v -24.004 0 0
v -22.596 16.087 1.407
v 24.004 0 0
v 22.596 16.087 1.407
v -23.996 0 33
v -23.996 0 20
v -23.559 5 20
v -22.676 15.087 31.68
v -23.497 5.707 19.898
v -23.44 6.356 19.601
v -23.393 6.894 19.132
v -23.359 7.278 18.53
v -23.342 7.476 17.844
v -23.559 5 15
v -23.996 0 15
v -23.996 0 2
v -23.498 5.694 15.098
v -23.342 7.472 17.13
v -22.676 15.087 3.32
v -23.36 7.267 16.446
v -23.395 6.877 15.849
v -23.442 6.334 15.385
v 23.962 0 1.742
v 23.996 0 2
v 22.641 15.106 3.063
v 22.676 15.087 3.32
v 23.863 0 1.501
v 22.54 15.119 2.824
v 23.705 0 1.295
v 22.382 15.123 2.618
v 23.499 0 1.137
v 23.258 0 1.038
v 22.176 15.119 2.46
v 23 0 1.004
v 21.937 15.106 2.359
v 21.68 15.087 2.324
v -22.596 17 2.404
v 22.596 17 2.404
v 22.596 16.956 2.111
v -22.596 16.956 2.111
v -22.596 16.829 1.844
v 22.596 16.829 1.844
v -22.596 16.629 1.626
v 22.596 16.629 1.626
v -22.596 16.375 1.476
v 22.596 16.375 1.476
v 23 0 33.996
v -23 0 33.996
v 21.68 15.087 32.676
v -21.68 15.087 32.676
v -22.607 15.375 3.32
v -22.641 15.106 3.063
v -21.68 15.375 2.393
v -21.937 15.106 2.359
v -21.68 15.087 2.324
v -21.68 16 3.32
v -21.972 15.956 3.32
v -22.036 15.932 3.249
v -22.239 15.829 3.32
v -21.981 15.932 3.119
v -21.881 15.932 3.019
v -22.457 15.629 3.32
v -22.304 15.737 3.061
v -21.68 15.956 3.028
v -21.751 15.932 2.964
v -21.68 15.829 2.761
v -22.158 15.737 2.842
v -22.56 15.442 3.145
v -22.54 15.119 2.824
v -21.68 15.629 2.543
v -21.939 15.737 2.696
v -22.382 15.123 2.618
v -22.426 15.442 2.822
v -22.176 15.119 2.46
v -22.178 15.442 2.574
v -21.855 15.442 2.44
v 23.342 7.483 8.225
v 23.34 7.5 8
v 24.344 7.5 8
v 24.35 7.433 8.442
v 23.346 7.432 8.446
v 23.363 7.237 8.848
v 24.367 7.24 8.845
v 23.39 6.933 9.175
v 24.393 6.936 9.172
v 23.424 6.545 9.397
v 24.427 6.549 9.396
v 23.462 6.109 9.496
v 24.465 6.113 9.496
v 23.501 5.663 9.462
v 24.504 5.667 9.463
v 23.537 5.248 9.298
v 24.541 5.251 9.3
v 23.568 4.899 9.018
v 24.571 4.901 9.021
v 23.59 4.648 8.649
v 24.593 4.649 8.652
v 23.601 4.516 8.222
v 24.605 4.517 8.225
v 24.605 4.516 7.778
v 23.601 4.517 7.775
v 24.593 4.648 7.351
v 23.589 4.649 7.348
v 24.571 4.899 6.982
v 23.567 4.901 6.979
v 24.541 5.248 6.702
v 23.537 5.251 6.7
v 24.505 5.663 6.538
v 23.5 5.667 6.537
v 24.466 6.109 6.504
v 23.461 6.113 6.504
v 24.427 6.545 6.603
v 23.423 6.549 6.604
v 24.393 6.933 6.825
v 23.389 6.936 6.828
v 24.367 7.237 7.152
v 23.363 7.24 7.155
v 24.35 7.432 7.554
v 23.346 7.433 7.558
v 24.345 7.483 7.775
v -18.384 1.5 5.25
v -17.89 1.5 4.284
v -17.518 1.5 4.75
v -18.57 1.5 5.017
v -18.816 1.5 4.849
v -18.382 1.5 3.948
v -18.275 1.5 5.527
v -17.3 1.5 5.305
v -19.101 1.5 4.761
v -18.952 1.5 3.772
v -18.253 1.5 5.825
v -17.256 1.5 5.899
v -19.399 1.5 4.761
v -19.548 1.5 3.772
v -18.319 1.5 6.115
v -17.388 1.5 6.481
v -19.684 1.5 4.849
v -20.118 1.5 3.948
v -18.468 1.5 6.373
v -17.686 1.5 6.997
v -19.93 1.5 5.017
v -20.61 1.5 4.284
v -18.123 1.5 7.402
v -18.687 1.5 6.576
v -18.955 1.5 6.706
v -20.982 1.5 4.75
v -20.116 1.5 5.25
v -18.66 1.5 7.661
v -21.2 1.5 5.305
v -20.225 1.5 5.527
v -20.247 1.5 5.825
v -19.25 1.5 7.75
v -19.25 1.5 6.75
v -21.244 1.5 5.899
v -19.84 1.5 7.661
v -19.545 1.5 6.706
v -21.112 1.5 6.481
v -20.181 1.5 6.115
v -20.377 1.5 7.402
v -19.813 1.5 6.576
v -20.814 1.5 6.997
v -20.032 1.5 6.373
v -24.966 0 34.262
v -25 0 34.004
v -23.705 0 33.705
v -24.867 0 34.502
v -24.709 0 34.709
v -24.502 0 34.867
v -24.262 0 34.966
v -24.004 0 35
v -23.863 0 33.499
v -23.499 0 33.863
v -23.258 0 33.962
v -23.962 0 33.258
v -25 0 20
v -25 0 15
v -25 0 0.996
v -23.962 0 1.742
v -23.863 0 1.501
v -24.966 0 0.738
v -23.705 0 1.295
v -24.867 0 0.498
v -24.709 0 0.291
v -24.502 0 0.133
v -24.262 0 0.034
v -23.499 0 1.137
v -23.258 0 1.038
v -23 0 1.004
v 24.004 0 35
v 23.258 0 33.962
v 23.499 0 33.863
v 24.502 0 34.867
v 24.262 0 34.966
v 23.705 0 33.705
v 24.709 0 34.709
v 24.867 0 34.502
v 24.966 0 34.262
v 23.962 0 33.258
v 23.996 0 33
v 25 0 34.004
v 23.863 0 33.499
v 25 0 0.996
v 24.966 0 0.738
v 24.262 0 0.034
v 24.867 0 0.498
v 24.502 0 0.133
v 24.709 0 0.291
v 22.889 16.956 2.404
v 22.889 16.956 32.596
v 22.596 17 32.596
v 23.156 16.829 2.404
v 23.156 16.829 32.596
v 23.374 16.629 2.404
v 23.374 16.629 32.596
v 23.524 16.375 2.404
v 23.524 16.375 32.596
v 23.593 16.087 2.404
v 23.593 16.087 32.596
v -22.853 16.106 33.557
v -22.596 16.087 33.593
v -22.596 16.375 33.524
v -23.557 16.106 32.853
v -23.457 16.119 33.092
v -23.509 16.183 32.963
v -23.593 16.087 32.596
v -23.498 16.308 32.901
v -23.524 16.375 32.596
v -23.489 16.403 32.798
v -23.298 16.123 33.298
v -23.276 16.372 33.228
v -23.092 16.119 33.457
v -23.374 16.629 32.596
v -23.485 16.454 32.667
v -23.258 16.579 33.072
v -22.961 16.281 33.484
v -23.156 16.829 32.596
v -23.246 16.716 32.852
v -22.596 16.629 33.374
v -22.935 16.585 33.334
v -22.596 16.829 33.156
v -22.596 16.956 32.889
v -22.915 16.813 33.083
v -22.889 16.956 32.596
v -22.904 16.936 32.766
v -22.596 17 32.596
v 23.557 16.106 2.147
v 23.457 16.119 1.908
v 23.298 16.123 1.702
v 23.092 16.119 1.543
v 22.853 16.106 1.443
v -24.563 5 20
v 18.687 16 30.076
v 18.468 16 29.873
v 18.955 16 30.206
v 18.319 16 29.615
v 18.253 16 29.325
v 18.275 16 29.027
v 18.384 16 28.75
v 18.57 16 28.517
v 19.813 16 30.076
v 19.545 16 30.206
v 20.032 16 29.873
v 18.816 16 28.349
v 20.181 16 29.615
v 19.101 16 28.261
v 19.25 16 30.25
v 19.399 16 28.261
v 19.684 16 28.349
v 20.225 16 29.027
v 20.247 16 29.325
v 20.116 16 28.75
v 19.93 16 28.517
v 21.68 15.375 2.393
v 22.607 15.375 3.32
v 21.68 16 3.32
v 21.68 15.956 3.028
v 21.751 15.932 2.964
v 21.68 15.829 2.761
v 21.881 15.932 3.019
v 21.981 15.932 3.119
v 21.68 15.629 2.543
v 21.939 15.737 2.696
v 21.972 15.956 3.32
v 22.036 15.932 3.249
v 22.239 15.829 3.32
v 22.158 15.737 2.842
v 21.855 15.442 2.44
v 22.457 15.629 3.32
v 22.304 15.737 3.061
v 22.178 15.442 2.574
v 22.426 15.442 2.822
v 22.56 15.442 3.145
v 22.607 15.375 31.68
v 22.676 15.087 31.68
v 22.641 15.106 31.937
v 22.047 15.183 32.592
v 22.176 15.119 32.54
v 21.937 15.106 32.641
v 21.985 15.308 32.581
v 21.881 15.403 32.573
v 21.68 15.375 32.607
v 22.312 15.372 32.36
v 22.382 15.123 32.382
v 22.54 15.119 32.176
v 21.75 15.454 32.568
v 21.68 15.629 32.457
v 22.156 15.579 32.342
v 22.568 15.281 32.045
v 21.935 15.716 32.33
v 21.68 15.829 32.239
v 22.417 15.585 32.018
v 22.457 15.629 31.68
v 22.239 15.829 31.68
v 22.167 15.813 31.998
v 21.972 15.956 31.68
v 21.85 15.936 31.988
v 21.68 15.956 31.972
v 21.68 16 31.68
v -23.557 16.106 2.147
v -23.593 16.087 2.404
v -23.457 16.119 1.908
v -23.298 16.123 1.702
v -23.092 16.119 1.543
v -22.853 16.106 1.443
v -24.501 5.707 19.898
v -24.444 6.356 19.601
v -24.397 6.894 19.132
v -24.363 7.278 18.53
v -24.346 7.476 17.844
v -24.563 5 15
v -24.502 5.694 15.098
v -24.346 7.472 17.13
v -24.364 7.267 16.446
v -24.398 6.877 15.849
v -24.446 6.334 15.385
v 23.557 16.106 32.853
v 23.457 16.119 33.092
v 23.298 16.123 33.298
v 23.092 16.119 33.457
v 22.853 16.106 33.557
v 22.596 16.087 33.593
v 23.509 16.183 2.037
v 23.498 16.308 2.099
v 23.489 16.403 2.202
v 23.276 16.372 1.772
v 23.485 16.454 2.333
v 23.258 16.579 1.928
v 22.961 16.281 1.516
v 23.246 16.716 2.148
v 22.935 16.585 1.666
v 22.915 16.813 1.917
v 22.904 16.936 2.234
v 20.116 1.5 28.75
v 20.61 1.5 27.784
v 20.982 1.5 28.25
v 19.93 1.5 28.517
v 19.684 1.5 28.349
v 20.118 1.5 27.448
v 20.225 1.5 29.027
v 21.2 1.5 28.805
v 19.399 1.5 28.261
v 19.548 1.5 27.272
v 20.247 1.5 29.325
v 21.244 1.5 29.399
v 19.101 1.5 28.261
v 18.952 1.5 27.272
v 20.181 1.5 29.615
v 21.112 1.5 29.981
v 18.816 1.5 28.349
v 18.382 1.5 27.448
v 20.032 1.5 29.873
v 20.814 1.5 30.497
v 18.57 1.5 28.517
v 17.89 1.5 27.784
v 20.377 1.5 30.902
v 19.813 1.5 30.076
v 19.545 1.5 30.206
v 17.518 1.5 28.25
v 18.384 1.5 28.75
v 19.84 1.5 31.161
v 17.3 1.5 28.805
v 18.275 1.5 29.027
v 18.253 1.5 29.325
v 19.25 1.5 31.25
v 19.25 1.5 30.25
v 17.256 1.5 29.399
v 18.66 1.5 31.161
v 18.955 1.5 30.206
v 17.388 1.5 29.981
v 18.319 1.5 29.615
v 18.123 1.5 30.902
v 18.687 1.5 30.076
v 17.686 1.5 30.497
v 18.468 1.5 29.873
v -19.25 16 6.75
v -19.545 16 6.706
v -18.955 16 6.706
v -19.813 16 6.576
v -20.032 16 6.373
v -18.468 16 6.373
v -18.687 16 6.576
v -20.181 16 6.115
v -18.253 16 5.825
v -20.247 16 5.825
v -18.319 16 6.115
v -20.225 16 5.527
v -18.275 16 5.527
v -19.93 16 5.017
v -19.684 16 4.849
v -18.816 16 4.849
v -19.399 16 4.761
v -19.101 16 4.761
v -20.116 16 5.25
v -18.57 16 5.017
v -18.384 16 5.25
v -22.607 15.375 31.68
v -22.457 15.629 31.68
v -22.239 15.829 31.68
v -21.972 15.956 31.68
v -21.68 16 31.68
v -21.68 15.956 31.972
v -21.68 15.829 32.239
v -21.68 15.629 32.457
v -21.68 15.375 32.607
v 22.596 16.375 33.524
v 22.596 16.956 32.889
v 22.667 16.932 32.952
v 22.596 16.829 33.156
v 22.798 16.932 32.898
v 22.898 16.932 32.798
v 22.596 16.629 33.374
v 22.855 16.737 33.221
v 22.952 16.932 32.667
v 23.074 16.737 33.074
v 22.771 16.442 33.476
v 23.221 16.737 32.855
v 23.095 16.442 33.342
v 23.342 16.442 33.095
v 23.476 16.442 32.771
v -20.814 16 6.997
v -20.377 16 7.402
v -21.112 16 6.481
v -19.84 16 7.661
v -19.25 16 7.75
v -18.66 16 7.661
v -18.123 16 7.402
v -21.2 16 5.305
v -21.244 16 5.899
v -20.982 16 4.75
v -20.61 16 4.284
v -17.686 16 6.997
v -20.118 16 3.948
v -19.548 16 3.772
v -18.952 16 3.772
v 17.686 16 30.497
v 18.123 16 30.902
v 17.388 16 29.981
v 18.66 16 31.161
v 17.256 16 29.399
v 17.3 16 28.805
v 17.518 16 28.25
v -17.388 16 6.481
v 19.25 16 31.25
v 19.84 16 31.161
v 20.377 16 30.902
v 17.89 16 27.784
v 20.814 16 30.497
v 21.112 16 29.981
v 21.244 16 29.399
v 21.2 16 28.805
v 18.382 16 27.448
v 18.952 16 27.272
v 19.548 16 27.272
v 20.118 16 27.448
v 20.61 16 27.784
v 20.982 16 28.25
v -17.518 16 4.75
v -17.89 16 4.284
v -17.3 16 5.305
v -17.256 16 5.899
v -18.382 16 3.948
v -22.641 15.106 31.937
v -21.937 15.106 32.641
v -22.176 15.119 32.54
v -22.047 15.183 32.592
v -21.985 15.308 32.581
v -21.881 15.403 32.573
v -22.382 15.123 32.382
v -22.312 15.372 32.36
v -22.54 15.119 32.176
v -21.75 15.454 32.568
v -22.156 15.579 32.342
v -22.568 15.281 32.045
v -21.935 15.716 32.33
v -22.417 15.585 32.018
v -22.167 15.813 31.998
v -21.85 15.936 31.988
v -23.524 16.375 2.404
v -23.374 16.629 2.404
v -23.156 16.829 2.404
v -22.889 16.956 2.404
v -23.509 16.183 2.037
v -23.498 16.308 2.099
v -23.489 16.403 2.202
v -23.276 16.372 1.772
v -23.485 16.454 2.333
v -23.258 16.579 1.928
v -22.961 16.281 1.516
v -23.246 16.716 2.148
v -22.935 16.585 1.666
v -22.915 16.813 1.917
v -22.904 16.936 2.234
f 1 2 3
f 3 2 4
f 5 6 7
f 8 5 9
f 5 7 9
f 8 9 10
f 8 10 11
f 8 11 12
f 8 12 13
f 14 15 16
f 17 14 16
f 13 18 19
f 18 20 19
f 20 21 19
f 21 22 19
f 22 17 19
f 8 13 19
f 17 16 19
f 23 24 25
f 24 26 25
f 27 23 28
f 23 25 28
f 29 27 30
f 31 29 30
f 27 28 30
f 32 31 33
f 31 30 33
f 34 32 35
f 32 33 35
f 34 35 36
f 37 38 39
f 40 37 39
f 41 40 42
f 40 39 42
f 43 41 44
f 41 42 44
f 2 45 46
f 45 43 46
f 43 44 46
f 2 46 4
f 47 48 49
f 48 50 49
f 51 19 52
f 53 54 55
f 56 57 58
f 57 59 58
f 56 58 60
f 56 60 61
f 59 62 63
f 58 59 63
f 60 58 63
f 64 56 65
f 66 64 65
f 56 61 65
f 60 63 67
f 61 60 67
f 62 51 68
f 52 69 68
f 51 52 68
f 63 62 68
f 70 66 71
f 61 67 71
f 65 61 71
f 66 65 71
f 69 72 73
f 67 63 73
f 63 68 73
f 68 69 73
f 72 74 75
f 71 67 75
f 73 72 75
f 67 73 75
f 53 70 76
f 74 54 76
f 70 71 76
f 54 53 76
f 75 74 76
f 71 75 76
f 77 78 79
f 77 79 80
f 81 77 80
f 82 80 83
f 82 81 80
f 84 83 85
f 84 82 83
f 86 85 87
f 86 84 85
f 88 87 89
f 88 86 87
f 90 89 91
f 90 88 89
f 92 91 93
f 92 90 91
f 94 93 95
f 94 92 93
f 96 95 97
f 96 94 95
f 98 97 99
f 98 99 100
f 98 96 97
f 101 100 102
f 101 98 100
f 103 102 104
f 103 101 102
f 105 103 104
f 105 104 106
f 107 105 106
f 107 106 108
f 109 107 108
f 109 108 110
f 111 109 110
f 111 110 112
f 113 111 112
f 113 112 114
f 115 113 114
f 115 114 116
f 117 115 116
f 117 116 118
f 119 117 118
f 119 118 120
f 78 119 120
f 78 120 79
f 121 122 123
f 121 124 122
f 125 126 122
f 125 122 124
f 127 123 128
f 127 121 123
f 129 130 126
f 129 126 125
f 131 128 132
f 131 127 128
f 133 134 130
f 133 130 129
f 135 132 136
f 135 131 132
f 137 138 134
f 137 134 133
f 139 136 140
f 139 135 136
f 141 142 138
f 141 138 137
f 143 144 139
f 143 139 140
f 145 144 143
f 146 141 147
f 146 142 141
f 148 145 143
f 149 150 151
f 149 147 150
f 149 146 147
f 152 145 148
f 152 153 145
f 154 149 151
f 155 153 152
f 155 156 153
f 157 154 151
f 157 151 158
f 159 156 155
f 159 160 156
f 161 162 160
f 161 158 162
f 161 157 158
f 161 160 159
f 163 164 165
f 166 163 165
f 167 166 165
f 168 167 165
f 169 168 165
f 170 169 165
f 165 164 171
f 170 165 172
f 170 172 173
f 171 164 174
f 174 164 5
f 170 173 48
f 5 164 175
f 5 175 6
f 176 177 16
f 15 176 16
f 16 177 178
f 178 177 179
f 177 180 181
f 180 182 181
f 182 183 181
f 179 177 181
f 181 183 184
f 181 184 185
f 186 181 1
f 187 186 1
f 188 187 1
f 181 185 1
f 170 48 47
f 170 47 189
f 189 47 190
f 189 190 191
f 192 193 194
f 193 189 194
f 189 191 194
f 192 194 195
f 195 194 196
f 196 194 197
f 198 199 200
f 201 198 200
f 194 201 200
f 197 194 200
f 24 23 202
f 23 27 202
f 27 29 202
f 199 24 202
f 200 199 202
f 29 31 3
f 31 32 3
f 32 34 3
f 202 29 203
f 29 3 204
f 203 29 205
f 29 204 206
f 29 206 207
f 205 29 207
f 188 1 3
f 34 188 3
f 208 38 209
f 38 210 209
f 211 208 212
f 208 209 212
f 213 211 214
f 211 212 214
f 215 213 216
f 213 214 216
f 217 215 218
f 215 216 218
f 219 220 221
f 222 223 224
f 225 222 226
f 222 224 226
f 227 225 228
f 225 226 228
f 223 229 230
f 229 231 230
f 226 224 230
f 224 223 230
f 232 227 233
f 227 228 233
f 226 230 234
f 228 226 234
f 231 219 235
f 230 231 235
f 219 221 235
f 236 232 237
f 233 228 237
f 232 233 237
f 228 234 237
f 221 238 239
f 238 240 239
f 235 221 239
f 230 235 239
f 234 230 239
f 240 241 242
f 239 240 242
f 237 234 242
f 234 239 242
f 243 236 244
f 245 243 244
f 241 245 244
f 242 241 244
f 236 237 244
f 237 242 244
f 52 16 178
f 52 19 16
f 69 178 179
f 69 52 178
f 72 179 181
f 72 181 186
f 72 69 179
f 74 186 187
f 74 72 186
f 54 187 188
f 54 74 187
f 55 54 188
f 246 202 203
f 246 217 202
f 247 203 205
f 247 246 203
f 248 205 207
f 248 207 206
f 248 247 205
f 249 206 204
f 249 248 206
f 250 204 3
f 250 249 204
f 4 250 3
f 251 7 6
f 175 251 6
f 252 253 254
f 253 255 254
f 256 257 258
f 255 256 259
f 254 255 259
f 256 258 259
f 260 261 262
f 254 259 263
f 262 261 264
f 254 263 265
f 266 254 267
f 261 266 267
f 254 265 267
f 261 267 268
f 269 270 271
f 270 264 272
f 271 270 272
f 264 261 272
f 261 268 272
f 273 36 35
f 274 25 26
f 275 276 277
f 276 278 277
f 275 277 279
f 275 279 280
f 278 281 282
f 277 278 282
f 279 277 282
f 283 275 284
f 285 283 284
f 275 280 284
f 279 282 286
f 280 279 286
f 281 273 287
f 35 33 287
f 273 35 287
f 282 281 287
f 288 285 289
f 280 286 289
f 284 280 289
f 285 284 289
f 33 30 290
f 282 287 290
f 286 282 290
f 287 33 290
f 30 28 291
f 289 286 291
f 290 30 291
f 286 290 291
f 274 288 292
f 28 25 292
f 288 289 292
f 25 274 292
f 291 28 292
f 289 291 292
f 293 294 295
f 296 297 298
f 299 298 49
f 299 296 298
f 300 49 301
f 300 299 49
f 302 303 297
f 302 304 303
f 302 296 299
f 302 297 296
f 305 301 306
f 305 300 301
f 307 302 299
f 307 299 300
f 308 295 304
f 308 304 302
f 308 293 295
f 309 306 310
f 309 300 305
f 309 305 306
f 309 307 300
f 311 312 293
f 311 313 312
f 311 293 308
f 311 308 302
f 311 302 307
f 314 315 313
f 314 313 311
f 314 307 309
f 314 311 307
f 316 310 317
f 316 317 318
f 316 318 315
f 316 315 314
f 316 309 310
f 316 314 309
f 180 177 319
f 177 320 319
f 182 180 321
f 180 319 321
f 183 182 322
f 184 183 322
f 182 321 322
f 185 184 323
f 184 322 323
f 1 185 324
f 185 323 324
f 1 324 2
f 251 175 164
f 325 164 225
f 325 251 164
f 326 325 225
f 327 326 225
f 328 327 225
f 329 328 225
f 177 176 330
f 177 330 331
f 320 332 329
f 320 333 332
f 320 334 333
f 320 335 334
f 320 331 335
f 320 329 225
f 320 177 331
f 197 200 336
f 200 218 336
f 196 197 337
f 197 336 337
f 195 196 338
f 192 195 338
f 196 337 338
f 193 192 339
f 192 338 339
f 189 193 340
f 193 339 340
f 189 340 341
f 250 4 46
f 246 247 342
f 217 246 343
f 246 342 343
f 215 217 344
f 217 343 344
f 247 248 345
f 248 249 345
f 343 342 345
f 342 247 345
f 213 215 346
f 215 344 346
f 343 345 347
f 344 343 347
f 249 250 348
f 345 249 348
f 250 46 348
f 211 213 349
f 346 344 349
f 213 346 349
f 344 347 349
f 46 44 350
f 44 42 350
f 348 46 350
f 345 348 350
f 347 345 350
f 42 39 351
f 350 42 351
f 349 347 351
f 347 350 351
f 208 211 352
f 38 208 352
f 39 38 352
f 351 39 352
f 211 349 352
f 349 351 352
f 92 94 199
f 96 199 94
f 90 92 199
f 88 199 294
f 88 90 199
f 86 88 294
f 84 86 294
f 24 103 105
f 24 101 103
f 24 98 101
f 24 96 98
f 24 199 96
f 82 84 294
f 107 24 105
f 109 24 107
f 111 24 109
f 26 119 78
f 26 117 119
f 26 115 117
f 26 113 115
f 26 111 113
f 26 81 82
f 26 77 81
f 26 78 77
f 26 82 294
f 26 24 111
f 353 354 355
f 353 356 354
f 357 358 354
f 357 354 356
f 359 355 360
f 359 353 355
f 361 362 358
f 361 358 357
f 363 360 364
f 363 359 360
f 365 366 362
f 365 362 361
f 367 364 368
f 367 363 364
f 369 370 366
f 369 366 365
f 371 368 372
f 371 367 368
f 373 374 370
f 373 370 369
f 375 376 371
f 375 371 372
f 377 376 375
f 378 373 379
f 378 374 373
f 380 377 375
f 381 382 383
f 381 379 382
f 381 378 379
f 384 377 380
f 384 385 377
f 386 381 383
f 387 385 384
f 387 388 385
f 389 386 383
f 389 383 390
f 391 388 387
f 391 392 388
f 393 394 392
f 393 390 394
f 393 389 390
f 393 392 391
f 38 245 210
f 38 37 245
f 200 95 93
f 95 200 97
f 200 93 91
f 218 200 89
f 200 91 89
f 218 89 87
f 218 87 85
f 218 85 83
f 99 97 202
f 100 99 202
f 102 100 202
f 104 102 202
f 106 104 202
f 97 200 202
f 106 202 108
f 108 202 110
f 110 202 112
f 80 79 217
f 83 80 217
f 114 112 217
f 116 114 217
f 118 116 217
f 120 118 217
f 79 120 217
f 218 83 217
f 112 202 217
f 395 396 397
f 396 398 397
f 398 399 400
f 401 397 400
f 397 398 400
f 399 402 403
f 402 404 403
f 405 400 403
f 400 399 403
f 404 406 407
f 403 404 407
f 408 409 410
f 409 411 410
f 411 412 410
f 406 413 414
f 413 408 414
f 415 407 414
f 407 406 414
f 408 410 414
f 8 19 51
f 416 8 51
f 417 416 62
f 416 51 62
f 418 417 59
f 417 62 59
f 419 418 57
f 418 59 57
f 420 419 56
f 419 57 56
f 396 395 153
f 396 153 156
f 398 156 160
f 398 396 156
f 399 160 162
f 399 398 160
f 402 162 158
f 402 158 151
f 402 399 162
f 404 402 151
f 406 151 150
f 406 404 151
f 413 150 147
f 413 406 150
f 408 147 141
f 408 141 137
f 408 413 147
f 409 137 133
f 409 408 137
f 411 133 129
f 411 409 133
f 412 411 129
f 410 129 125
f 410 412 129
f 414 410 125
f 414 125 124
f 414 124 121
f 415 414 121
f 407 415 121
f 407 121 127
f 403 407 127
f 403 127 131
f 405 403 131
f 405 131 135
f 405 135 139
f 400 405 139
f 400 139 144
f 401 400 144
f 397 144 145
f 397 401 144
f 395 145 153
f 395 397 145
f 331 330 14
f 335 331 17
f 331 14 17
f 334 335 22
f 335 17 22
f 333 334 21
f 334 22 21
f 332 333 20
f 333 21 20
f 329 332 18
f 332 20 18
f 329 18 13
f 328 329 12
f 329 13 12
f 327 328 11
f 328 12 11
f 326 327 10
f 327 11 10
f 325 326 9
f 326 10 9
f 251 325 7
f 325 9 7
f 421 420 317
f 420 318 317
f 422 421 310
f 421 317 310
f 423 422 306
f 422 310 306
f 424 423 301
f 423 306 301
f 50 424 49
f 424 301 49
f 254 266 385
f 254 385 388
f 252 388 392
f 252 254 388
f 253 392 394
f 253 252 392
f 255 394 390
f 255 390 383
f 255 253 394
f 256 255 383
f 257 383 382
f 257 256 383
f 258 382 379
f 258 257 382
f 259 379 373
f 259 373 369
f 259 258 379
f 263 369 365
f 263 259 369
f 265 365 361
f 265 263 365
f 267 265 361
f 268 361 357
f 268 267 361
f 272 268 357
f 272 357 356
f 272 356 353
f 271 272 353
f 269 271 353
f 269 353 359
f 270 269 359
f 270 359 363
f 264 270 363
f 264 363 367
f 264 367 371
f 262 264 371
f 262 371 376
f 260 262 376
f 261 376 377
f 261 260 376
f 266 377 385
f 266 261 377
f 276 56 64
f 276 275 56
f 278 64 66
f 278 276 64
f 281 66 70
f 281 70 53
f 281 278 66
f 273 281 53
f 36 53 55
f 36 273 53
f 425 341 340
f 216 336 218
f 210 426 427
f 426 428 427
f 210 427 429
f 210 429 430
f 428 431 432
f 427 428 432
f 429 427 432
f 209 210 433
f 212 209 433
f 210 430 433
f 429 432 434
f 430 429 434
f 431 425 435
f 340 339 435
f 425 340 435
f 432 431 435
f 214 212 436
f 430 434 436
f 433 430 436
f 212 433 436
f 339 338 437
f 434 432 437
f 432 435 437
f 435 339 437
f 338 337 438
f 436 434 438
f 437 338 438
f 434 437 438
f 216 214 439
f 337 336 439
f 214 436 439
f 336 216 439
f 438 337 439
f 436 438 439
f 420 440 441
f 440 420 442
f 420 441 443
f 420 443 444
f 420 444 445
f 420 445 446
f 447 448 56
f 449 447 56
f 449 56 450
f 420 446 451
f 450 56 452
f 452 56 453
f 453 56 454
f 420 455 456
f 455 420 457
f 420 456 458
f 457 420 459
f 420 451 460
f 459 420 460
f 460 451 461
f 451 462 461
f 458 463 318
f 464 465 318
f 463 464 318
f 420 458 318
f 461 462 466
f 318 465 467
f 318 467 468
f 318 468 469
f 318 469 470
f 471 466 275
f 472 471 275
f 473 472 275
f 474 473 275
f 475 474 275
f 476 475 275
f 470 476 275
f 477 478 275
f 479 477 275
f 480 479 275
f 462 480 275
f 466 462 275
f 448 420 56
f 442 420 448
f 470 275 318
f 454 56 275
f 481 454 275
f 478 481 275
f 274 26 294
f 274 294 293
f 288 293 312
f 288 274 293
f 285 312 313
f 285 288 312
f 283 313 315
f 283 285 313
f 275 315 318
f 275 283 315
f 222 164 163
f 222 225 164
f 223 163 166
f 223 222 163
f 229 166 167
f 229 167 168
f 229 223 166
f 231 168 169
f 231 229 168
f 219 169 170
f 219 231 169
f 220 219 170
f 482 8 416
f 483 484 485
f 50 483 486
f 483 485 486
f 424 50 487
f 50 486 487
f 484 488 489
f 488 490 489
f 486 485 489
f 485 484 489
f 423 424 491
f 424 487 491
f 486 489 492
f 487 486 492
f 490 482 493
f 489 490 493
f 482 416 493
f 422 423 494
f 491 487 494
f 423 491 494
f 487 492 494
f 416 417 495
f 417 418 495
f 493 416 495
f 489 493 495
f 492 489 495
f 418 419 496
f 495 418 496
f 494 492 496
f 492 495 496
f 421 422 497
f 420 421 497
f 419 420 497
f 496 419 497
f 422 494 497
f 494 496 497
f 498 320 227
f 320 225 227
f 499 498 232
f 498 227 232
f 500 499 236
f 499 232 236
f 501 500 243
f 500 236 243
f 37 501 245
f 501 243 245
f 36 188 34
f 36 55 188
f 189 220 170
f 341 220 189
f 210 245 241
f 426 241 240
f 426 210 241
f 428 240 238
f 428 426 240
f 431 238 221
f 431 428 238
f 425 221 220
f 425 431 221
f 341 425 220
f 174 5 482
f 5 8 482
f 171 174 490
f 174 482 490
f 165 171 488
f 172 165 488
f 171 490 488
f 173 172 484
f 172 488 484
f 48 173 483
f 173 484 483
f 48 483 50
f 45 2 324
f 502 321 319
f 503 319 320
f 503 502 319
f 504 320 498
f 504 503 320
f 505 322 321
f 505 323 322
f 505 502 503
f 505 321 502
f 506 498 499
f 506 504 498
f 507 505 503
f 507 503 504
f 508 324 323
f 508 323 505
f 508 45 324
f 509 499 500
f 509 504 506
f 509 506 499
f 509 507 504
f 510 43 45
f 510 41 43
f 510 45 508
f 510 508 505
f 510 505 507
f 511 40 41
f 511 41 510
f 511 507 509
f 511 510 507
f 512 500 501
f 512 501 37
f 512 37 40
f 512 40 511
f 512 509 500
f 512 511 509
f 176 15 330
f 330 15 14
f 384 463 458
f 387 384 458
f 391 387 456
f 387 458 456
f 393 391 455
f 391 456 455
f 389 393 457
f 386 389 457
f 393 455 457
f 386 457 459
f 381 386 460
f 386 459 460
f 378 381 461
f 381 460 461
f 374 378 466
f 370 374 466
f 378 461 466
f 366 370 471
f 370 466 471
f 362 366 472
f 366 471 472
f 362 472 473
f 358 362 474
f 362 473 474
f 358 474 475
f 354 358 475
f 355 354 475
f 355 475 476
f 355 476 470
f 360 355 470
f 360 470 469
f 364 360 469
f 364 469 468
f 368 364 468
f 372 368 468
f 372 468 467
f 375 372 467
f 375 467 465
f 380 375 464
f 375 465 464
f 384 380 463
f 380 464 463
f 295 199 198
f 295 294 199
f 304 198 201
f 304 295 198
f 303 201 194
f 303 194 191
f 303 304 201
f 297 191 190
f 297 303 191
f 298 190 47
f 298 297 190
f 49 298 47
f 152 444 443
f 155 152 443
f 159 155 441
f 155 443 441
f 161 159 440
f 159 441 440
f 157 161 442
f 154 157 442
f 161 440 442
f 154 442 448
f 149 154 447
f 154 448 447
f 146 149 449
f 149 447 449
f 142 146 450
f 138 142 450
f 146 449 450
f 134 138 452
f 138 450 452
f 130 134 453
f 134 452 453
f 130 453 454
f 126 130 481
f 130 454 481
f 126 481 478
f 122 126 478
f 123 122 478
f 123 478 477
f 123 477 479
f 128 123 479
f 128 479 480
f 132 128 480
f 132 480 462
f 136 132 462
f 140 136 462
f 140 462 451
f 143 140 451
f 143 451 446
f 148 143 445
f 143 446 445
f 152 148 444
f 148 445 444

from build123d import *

# Parameters (mm, degrees)
ESQUISSE1_W             = 50
ESQUISSE1_H             = 17
BOSS_EXTRU_1_DEPTH      = 35
D_POUILLE2_ANGLE        = -5
COQUE2_T                = -1
CONG_1_R                = 1
ESQUISSE2_R             = 2
ESQUISSE2_R_2           = 1
BOSS_EXTRU_2_DEPTH      = 14.5
ENL_V_MAT_EXTRU_1_REACH = 48.249
ENL_V_MAT_EXTRU_2_REACH = 48.249
ESQUISSE4_R             = 1.5


with BuildPart() as part:
    # Esquisse1 → Boss.-Extru.1 (new body)
    with BuildSketch(Plane.XY):
        with Locations((0, 8.5)):
            Rectangle(ESQUISSE1_W, ESQUISSE1_H)
    extrude(amount=BOSS_EXTRU_1_DEPTH)

    # Dépouille2
    d_pouille2_faces = [part.faces().sort_by_distance(p)[0] for p in [
        (0, 8.5, 0),
        (25, 8.5, 17.5),
        (-25, 8.5, 17.5),
        (0, 8.5, 35),
    ]]
    draft(d_pouille2_faces, Plane(origin=(-25, 0, 35), x_dir=(-1, 0, 0), z_dir=(0, -1, 0)), D_POUILLE2_ANGLE)

    # Coque2
    coque2_openings = [part.faces().sort_by_distance(p)[0] for p in [
        (0, 0, 17.5),
    ]]
    offset(amount=COQUE2_T, openings=coque2_openings, kind=Kind.INTERSECTION)

    # Congé1
    cong_1_edges = [part.edges().sort_by_distance(p)[0] for p in [
        (24.25634636, 8.5, 34.25634636),
        (0, 17, 33.51269272),
        (-23.296270854, 8, 1.703729146),
        (-22.596361546, 16, 17.5),
        (23.296270854, 8, 1.703729146),
        (0, 16, 2.403638454),
        (22.596361546, 16, 17.5),
        (-23.296270854, 8, 33.296270854),
        (23.296270854, 8, 33.296270854),
        (0, 16, 32.596361546),
        (-24.25634636, 8.5, 34.25634636),
        (0, 17, 1.48730728),
        (24.25634636, 8.5, 0.74365364),
        (-24.25634636, 8.5, 0.74365364),
        (-23.51269272, 17, 17.5),
        (23.51269272, 17, 17.5),
    ]]
    fillet(cong_1_edges, radius=CONG_1_R)

    # Esquisse2 → Boss.-Extru.2 (add)
    # profile 1 of 2: a face of its own
    with BuildSketch(Plane(origin=(0, 16, 0), x_dir=(-1, 0, 0), z_dir=(0, -1, 0))):
        with Locations(Location((-19.25, -29.25, 0), (0, 0, 270))):
            Circle(ESQUISSE2_R)
        with Locations(Location((-19.25, -29.25, 0), (0, 0, 270))):
            Circle(ESQUISSE2_R_2, mode=Mode.SUBTRACT)
    # profile 2 of 2: a face of its own
    with BuildSketch(Plane(origin=(0, 16, 0), x_dir=(-1, 0, 0), z_dir=(0, -1, 0))):
        with Locations(Location((19.25, -5.75, 0), (0, 0, 270))):
            Circle(ESQUISSE2_R)
        with Locations(Location((19.25, -5.75, 0), (0, 0, 270))):
            Circle(ESQUISSE2_R_2, mode=Mode.SUBTRACT)
    extrude(amount=BOSS_EXTRU_2_DEPTH)

    # Esquisse3 → Enlèv. mat.-Extru.1 (cut, up to next)
    with BuildSketch(Plane(origin=(0, 0, 0), x_dir=(0, 0, -1), z_dir=(1, 0, 0)), mode=Mode.PRIVATE) as enl_v_mat_extru_1_sk1:
        with BuildLine():
            Line((-20, 5), (-20, -1))
            Line((-20, -1), (-15, -1))
            Line((-15, -1), (-15, 5))
            ThreePointArc((-15, 5), (-17.5, 7.5), (-20, 5))
        make_face()
    enl_v_mat_extru_1_tool1 = extrude(enl_v_mat_extru_1_sk1.sketch, amount=-ENL_V_MAT_EXTRU_1_REACH, mode=Mode.PRIVATE) & part.part
    add(enl_v_mat_extru_1_tool1.solids().sort_by_distance((0, 3.001296, 17.5))[0], mode=Mode.SUBTRACT)

    # Enlèv. mat.-Extru.2: up to this plane
    enl_v_mat_extru_2_end = Plane(origin=(25, 0, 35), z_dir=(0.9961946980917455, 0.08715574274765836, 0))
    # Esquisse4 → Enlèv. mat.-Extru.2 (cut, up to the surface)
    with BuildSketch(Plane(origin=(0, 0, 0), x_dir=(0, 0, -1), z_dir=(1, 0, 0)), mode=Mode.PRIVATE) as enl_v_mat_extru_2_sk1:
        with Locations(Location((-8, 6, 0), (0, 0, 90))):
            Circle(ESQUISSE4_R)
    enl_v_mat_extru_2_tool1 = split(extrude(enl_v_mat_extru_2_sk1.sketch, amount=ENL_V_MAT_EXTRU_2_REACH, mode=Mode.PRIVATE), bisect_by=enl_v_mat_extru_2_end, keep=Keep.BOTH, mode=Mode.PRIVATE)
    add(enl_v_mat_extru_2_tool1.solids().sort_by_distance((0, 6, 8))[0], mode=Mode.SUBTRACT)


solid = part.part
